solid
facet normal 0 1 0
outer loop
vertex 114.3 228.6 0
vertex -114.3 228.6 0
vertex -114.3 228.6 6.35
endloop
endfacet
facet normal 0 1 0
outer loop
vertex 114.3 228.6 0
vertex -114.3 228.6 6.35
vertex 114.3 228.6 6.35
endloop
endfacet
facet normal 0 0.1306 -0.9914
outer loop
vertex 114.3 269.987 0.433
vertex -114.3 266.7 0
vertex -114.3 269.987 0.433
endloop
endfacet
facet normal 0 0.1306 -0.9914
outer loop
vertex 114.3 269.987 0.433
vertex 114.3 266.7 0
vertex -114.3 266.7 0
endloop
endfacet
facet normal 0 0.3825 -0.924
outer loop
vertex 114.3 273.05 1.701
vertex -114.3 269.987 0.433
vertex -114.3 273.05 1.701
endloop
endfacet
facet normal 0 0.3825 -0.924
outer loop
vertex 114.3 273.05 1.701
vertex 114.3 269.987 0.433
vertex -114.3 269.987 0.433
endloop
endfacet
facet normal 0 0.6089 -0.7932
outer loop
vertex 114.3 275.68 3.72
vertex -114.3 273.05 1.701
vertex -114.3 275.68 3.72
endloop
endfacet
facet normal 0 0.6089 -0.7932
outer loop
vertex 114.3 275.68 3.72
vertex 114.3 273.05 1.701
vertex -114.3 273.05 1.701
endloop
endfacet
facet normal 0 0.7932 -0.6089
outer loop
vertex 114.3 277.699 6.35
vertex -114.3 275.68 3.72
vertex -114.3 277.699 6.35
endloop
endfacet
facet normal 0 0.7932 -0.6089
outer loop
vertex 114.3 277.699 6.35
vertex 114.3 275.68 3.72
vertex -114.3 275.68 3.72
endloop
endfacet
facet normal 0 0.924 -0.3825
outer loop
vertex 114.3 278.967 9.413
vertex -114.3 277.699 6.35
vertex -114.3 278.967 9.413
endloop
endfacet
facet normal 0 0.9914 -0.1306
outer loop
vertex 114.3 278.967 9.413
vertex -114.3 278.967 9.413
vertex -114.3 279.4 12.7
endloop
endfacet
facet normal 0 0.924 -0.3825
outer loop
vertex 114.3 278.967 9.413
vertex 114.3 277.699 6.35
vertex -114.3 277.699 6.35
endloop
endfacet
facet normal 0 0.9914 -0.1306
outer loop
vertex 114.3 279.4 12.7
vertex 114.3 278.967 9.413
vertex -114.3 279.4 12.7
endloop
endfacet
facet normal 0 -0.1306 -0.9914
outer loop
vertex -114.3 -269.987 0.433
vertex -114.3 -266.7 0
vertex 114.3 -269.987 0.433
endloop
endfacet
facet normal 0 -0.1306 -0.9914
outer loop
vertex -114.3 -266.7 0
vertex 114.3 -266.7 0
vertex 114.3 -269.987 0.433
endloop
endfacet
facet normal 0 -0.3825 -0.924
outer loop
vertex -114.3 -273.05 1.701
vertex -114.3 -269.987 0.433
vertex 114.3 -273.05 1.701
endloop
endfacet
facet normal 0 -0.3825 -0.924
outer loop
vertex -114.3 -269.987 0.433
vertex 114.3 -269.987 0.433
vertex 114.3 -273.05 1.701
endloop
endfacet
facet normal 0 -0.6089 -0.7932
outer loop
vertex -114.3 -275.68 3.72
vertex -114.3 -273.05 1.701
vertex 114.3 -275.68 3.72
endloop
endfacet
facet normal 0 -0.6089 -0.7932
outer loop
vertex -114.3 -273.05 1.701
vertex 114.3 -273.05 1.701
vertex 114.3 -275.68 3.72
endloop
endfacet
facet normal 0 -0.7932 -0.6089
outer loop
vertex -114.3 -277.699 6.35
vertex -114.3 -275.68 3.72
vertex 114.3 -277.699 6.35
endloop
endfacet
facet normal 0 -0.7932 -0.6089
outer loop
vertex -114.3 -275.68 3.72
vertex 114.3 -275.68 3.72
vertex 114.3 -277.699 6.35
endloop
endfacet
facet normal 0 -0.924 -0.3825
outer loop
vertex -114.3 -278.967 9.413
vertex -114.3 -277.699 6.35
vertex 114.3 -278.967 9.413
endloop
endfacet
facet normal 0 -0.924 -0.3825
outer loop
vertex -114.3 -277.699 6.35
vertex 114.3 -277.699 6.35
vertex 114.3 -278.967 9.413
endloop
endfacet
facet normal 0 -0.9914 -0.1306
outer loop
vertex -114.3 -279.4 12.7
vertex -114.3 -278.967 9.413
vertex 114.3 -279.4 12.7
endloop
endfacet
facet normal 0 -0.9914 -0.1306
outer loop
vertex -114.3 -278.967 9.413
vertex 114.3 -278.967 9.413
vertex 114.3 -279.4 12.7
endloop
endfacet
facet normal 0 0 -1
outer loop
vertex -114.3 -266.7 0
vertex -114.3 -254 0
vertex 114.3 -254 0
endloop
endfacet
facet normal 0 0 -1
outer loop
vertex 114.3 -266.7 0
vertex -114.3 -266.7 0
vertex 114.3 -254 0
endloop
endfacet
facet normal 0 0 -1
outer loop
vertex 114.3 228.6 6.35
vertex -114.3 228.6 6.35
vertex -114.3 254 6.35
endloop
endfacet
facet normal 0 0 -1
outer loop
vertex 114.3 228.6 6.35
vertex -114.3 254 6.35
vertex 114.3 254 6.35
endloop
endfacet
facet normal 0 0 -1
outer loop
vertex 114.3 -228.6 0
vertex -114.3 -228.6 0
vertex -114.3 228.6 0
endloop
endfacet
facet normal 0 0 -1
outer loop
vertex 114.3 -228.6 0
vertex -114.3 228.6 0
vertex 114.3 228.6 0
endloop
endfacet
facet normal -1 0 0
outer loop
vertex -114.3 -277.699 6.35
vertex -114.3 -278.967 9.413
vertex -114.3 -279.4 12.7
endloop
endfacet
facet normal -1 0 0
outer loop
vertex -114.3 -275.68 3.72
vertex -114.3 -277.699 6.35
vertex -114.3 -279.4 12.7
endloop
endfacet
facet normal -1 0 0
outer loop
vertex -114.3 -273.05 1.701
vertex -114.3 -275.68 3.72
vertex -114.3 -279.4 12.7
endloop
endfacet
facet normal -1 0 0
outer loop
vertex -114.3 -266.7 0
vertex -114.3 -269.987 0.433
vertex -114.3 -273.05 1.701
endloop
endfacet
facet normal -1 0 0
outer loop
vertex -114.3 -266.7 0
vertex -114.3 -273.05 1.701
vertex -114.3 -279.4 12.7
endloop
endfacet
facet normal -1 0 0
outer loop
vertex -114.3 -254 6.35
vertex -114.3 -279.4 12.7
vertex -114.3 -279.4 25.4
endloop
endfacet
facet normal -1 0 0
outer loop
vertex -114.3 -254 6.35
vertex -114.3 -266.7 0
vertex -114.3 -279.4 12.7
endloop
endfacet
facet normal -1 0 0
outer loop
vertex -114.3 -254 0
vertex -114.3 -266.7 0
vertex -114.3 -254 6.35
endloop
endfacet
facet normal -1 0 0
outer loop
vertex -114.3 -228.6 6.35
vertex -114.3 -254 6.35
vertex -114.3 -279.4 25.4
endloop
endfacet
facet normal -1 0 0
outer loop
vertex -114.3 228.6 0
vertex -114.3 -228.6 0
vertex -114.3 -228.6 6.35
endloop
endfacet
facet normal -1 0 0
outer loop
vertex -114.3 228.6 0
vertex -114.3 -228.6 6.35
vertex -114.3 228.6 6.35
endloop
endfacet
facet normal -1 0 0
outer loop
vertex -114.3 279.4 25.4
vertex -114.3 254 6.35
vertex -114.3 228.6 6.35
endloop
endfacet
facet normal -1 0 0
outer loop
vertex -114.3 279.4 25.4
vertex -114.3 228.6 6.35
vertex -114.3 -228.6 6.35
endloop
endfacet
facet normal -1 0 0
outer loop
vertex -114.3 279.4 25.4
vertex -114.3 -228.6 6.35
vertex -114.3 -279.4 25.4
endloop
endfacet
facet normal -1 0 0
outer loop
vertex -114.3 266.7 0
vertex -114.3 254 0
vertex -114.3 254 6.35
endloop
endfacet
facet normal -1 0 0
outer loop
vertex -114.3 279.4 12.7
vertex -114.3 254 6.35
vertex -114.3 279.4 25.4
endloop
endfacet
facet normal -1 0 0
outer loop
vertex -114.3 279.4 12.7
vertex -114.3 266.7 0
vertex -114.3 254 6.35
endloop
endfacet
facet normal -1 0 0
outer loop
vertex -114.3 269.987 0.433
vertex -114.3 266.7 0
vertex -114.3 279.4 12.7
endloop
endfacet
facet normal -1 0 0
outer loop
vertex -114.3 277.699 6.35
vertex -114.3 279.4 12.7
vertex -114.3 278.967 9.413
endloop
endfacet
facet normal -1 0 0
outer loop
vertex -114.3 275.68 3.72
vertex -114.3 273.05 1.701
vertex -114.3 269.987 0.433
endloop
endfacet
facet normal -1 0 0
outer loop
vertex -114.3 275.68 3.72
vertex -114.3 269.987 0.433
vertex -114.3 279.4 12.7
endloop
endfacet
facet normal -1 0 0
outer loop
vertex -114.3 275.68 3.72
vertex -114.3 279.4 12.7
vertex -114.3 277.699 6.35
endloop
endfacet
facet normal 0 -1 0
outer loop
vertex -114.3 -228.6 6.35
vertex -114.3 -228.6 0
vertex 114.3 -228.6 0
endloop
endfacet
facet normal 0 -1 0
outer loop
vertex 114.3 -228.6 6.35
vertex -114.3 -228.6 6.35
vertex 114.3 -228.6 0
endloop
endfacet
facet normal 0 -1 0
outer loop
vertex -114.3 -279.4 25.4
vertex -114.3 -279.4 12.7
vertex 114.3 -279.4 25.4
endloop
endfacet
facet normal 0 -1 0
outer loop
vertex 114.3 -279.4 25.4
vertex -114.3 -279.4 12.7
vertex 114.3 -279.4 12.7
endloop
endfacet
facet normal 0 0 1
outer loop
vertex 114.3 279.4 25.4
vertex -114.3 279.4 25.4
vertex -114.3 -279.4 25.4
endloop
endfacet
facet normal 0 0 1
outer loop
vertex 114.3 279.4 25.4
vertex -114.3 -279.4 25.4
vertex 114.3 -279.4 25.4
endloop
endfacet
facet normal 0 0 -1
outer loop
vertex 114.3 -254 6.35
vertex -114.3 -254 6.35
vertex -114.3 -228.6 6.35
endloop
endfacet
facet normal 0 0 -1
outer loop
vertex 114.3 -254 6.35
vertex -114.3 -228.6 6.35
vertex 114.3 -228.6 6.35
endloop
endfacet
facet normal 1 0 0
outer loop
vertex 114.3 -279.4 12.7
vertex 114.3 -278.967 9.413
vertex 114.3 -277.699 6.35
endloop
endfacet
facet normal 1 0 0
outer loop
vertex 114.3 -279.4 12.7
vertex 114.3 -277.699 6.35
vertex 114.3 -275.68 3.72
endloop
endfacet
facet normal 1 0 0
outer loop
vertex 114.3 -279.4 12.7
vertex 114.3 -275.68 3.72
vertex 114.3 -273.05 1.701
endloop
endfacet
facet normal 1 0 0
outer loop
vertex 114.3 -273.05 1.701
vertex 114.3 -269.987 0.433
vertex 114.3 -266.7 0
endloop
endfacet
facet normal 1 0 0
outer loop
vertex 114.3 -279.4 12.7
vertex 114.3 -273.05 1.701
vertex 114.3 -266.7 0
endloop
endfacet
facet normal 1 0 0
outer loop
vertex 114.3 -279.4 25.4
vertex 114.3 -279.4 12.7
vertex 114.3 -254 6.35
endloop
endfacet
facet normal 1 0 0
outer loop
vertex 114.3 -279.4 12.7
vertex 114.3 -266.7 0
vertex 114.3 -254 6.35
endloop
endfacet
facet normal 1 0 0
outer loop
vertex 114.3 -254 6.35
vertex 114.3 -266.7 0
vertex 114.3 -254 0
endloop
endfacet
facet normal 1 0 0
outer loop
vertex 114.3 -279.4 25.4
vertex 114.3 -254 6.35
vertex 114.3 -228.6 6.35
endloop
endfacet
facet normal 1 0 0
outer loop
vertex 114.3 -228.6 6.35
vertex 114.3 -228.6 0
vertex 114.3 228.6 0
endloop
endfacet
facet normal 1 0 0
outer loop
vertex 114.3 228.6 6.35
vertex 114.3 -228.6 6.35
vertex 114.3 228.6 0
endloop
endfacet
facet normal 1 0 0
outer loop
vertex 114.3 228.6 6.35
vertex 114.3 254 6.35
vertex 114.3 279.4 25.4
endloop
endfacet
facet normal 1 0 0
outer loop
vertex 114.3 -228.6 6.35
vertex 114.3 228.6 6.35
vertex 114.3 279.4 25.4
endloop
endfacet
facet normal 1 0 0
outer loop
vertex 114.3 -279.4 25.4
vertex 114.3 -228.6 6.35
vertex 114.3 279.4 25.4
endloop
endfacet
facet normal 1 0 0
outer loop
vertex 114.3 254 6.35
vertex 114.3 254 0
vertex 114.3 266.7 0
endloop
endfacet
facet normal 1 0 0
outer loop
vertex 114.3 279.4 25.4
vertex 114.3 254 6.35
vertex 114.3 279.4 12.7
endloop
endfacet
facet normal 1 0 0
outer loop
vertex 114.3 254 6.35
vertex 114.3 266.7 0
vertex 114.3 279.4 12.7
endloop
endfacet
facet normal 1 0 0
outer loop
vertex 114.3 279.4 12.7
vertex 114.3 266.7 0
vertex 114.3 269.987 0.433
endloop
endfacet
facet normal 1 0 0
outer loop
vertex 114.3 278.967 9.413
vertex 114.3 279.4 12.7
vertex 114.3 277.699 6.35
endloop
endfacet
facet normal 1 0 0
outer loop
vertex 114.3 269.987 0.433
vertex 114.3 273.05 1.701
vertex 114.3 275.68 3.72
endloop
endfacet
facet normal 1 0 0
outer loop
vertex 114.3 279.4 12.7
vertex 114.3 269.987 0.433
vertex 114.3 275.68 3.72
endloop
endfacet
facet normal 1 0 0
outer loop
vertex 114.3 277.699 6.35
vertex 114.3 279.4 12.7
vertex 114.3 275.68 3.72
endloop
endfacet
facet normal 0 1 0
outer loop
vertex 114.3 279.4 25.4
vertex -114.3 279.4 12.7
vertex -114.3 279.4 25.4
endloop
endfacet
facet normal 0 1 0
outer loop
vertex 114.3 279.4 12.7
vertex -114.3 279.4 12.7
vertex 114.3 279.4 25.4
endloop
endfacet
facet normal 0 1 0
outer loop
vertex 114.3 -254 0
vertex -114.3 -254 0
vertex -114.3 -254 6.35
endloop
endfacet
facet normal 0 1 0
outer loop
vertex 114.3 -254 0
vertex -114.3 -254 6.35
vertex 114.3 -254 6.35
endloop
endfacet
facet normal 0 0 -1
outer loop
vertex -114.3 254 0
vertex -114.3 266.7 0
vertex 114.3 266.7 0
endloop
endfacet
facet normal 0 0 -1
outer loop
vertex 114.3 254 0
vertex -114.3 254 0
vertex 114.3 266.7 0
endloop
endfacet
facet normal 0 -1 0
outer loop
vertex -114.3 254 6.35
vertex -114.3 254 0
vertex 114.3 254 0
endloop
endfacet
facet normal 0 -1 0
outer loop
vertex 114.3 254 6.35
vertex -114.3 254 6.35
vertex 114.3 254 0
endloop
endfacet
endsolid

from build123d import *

# Parameters (mm, degrees)
F0_W     = 228.6
F0_H     = 558.8
F1_DEPTH = 25.4
F2_W     = 228.6
F2_H     = 25.4
F3_DEPTH = 6.35
F4_W     = 228.6
F4_H     = 25.4
F5_DEPTH = 6.35
F6_R     = 12.7


with BuildPart() as f1:
    # F0 (on Top) → F1 (new body)
    with BuildSketch(Plane.XY):
        Rectangle(F0_W, F0_H)
    extrude(amount=F1_DEPTH)

    # F2 (on face) → F3 (cut)
    with BuildSketch(Plane(origin=(0, 0, 0), x_dir=(1, 0, 0), z_dir=(0, 0, -1))):
        with Locations((0, 241.3)):
            Rectangle(F2_W, F2_H)
    extrude(amount=-F3_DEPTH, mode=Mode.SUBTRACT)

    # F4 (on face) → F5 (cut)
    with BuildSketch(Plane(origin=(0, 0, 0), x_dir=(1, 0, 0), z_dir=(0, 0, -1))):
        with Locations((0, -241.3)):
            Rectangle(F4_W, F4_H)
    extrude(amount=-F5_DEPTH, mode=Mode.SUBTRACT)

    # F6
    f6_edges = [f1.edges().sort_by_distance(p)[0] for p in [
        (0, -279.4, 0),
        (0, 279.4, 0),
    ]]
    fillet(f6_edges, radius=F6_R)


solid = f1.part
